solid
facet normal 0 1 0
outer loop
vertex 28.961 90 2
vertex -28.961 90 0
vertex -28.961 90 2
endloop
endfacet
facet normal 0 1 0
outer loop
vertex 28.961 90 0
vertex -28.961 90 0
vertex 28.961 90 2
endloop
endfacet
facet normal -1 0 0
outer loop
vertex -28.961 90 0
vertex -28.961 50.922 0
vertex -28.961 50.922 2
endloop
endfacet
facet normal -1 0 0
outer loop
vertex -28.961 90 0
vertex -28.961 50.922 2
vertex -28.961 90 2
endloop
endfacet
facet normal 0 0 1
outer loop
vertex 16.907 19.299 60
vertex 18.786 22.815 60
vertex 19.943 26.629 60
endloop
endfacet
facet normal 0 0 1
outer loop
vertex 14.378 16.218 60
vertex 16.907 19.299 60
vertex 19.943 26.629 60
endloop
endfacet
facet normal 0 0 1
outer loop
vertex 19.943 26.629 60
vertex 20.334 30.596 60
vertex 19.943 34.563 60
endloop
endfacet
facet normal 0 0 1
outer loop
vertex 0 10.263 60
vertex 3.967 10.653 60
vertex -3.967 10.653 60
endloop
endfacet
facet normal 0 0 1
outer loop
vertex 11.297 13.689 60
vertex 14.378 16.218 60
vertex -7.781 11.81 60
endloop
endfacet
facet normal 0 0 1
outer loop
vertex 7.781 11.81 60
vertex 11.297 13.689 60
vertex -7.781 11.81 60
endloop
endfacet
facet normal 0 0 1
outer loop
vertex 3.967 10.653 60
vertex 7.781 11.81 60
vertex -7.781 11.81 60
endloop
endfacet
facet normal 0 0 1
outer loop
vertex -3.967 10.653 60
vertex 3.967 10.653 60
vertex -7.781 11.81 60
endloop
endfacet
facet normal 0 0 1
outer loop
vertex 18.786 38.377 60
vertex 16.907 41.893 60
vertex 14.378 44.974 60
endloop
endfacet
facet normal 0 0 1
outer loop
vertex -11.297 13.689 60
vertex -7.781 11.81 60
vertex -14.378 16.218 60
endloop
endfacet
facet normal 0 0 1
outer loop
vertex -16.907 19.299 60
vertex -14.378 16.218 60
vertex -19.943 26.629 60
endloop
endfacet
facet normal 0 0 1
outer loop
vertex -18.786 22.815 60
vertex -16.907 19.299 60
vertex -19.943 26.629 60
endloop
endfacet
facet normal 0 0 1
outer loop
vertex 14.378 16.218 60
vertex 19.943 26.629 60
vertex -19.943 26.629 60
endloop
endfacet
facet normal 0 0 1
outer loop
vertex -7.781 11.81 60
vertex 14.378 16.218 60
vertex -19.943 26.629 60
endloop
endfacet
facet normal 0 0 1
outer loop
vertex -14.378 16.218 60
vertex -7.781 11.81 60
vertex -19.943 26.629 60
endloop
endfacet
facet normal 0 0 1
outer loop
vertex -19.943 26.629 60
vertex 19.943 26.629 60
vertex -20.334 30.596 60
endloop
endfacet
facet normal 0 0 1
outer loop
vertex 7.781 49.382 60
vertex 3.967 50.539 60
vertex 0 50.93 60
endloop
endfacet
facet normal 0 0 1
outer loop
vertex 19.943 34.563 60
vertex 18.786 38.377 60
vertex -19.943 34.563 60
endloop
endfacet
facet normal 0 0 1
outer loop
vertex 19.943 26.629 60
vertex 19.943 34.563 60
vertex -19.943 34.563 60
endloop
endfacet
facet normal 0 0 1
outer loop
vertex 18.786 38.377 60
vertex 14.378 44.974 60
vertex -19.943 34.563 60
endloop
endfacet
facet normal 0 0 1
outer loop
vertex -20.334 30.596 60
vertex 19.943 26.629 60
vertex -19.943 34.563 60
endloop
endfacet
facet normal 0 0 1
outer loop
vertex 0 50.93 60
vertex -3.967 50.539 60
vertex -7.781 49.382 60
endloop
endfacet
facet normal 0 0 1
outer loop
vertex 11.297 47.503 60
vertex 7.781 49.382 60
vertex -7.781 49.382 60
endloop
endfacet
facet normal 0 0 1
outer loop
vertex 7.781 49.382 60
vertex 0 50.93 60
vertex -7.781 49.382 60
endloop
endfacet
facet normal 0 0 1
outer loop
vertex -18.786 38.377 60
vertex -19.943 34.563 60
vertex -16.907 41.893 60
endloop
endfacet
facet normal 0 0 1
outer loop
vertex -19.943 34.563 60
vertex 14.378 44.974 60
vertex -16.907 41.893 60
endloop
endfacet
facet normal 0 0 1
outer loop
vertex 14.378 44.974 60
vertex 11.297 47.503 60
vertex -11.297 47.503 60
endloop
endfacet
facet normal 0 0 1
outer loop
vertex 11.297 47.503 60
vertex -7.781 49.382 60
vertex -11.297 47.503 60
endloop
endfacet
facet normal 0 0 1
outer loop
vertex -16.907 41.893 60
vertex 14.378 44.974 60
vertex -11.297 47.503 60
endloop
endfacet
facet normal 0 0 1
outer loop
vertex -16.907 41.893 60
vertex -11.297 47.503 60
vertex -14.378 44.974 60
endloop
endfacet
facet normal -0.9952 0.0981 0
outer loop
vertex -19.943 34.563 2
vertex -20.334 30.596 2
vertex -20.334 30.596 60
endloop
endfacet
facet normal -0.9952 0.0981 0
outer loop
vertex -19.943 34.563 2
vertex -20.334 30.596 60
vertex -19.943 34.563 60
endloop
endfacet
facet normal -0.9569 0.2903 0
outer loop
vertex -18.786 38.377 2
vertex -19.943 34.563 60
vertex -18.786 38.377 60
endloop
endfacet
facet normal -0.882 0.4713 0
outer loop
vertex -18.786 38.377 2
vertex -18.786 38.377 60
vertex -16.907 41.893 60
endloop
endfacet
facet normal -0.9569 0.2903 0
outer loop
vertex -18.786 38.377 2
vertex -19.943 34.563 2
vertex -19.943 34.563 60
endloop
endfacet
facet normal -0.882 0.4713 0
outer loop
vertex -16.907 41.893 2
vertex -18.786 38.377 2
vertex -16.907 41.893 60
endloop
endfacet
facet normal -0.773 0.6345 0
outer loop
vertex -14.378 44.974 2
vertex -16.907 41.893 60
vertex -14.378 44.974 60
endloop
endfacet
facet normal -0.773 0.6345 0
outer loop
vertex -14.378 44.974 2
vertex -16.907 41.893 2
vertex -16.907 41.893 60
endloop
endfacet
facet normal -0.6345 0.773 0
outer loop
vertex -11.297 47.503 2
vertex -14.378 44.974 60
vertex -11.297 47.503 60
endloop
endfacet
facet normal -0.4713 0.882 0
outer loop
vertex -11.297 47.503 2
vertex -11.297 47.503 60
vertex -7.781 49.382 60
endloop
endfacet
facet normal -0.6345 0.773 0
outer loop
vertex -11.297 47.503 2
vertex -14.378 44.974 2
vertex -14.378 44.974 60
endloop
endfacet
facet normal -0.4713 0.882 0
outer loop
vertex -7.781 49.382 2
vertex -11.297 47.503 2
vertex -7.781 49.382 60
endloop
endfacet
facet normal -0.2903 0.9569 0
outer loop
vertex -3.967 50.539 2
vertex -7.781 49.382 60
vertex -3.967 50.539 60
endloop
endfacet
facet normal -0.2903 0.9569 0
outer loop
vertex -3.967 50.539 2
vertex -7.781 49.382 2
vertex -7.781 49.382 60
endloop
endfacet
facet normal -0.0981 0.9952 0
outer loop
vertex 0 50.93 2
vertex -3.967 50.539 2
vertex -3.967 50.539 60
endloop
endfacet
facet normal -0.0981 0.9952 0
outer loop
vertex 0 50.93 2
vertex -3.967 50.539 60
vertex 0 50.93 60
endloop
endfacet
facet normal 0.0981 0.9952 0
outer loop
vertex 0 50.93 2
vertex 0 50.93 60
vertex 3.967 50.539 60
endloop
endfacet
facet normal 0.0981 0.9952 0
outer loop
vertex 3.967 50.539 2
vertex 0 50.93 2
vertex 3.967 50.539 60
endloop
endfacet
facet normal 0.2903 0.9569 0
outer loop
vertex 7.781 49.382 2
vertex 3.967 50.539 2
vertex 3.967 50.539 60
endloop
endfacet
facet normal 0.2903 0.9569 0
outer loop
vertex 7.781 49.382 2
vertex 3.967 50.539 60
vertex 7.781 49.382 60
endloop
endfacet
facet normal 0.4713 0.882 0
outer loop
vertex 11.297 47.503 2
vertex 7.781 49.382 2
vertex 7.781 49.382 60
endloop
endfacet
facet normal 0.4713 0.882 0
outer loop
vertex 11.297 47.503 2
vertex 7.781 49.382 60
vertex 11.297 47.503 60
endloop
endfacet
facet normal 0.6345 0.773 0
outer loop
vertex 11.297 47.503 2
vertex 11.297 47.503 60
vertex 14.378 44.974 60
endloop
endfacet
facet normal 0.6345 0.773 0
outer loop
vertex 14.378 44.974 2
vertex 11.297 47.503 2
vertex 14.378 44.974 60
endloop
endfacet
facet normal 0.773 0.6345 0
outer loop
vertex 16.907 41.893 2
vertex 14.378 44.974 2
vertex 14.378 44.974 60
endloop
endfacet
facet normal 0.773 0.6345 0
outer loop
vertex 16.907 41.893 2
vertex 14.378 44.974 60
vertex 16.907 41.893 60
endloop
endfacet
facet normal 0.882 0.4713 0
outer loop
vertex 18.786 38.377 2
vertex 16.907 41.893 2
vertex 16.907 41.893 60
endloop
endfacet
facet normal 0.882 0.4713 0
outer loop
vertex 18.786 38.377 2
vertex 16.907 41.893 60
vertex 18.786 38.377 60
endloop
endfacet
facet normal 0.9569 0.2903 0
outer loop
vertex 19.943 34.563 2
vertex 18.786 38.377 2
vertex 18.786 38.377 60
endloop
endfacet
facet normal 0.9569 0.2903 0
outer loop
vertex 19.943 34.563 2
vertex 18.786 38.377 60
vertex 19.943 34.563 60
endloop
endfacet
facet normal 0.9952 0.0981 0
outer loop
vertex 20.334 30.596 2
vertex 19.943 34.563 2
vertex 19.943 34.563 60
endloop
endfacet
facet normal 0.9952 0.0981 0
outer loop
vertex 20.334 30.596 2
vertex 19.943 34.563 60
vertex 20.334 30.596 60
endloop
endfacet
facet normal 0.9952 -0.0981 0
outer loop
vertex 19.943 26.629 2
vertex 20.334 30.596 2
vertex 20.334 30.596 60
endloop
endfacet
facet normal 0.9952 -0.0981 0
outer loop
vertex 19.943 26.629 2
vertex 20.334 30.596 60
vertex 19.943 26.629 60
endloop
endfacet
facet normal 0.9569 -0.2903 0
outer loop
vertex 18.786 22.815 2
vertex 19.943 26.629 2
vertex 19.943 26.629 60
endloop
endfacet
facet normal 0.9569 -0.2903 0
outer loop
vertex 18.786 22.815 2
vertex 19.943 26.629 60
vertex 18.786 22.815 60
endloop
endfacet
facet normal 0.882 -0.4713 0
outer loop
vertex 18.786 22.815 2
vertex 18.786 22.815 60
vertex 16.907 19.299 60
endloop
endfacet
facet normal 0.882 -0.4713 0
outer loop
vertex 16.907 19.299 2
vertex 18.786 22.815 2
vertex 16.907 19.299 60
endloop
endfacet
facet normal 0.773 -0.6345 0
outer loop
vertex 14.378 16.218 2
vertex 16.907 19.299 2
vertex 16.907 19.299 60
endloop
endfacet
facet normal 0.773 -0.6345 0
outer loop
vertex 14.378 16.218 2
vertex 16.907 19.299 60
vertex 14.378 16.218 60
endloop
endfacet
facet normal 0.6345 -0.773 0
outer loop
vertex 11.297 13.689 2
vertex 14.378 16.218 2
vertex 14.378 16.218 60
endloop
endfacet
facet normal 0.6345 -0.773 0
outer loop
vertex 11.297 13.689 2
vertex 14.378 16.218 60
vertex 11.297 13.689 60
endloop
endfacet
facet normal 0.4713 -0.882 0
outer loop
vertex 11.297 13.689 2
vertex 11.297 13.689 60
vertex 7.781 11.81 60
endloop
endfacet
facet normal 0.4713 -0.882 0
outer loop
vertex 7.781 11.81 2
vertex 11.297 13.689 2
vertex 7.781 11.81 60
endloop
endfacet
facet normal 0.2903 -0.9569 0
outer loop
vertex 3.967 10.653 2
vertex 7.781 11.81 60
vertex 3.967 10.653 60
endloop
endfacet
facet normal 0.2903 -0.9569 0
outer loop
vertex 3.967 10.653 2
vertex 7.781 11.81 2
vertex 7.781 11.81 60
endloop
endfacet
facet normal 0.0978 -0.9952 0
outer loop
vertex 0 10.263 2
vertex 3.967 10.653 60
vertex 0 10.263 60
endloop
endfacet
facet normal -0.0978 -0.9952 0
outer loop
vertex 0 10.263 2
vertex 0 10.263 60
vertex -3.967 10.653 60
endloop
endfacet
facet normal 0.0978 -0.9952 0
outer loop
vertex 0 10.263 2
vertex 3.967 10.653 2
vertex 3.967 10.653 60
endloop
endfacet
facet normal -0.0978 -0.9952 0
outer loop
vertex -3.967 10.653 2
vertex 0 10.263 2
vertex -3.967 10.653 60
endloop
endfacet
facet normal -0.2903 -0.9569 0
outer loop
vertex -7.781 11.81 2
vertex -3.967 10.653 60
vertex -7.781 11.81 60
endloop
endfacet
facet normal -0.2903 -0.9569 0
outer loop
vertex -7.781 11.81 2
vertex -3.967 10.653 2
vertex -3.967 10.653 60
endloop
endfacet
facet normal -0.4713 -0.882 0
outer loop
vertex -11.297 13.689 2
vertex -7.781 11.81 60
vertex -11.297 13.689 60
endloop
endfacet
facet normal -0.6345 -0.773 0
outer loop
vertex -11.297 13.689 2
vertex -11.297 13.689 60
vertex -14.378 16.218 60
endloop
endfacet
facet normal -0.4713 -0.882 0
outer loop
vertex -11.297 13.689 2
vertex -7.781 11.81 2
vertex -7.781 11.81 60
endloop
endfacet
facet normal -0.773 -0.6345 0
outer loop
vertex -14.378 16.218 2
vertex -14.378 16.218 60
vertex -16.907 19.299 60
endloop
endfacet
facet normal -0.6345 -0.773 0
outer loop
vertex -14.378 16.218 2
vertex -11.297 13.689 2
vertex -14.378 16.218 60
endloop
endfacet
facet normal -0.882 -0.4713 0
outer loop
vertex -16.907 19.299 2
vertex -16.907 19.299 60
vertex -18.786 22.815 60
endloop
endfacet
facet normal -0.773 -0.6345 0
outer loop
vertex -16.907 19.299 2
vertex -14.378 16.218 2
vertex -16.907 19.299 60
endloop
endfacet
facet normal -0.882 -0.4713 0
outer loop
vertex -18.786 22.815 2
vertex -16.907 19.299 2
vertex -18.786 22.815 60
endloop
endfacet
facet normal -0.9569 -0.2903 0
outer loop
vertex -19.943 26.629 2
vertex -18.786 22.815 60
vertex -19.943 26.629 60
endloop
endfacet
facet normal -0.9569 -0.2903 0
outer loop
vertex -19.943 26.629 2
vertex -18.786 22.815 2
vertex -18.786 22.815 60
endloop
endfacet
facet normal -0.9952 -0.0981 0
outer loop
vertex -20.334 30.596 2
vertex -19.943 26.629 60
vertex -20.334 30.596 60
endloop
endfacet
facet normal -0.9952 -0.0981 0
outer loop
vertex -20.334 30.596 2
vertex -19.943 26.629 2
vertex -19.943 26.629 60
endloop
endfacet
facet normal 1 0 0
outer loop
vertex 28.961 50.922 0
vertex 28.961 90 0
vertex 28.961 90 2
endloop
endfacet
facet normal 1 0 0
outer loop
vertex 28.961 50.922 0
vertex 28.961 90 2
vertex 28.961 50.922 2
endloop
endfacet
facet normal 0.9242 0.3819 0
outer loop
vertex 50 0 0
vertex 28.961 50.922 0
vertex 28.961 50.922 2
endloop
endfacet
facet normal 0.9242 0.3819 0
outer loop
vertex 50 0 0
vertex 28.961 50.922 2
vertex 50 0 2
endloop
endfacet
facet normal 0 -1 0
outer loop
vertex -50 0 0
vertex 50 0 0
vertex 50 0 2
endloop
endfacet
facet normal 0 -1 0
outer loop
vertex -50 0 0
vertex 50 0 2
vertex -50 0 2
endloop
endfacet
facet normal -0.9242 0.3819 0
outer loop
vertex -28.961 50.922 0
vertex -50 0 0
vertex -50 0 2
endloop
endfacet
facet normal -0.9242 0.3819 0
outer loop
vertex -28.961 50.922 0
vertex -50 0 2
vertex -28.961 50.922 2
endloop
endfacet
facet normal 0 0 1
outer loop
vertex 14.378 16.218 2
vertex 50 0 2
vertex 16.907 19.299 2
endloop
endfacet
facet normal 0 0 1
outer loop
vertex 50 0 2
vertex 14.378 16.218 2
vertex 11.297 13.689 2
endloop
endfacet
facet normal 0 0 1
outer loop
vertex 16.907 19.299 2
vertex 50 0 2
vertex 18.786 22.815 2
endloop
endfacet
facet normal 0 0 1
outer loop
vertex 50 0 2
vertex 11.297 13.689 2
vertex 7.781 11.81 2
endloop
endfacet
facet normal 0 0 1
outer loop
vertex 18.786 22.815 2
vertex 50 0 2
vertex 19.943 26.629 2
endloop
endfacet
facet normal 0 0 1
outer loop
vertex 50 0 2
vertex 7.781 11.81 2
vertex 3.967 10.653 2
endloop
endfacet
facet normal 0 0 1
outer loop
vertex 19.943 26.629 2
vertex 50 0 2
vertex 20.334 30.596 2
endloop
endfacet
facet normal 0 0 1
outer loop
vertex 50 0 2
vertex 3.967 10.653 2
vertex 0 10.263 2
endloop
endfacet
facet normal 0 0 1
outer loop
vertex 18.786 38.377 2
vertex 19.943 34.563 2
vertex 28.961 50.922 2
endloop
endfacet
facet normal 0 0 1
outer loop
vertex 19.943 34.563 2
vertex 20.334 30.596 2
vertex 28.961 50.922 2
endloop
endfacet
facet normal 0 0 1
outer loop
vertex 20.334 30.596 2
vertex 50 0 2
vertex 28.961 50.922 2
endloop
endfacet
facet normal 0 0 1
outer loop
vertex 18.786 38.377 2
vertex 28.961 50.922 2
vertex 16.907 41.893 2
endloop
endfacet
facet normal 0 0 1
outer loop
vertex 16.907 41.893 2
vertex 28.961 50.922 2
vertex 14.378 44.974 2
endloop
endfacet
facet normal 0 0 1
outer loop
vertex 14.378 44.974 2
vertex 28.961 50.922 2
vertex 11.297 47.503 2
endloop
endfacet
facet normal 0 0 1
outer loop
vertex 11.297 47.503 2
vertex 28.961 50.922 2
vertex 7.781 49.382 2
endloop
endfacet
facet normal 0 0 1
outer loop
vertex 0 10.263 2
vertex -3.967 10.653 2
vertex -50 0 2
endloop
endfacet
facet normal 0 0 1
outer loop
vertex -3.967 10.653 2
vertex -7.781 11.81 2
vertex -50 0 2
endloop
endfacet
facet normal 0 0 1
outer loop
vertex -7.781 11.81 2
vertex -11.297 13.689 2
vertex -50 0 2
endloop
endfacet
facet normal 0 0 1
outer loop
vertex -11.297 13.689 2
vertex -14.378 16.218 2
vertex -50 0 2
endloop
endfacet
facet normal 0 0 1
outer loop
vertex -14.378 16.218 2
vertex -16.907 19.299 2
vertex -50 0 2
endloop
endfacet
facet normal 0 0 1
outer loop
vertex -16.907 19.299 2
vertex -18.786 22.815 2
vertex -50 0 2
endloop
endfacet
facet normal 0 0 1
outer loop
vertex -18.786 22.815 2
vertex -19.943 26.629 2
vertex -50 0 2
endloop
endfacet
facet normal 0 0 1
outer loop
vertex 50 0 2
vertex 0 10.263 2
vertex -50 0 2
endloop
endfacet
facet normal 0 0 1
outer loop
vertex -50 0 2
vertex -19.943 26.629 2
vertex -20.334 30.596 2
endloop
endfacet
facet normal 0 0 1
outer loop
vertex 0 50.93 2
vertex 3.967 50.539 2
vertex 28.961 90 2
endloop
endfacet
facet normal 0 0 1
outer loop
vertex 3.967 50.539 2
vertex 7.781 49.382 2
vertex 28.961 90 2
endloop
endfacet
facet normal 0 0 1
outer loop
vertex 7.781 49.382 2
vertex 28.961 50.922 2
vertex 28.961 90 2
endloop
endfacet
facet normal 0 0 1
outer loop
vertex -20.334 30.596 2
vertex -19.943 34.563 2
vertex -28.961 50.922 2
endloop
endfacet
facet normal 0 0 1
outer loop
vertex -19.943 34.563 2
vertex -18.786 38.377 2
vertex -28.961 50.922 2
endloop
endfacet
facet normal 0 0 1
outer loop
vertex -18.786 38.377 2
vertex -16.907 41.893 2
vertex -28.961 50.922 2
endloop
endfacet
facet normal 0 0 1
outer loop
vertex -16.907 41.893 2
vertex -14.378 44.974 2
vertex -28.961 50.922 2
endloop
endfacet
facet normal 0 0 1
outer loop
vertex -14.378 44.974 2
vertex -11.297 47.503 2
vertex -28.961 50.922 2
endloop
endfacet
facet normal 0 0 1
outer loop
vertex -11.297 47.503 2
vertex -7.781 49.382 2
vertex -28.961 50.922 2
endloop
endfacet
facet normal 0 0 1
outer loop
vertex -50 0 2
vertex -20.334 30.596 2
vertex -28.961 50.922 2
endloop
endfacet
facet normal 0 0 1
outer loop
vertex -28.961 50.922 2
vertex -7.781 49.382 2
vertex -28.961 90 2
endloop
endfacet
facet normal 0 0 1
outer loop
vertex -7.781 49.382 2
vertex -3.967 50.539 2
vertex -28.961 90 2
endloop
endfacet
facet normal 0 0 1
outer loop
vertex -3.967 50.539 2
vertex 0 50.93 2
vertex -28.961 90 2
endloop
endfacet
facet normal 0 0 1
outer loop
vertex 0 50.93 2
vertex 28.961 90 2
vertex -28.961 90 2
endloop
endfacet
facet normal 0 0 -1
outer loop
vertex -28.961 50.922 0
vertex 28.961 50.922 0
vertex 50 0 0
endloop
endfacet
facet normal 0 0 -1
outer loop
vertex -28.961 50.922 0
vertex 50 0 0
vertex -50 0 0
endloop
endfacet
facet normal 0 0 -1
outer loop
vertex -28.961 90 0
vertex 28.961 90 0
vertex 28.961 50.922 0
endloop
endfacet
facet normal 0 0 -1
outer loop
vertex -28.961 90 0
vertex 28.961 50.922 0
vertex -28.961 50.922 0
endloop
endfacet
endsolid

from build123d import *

# Parameters (mm, degrees)
EXTRUDE_1_DEPTH = 2
SKETCH_3_R      = 20.333518405
EXTRUDE_2_DEPTH = 60


with BuildPart() as part:
    # 草图1 → 凸台-拉伸1 (new body)
    with BuildSketch(Plane.XY):
        Polygon((-50, 0), (-28.960949348, 50.922075999), (-28.960949348, 90), (28.960949348, 90), (28.960949348, 50.922075999), (50, 0), align=None)
    extrude(amount=EXTRUDE_1_DEPTH)

    # 草图3 → 凸台-拉伸2 (add)
    with BuildSketch(Plane(origin=(0, 0, 0), x_dir=(-1, 0, 0), z_dir=(0, 0, -1))):
        with Locations((0, 30.596151571)):
            Circle(SKETCH_3_R)
    extrude(amount=-EXTRUDE_2_DEPTH)


solid = part.part
